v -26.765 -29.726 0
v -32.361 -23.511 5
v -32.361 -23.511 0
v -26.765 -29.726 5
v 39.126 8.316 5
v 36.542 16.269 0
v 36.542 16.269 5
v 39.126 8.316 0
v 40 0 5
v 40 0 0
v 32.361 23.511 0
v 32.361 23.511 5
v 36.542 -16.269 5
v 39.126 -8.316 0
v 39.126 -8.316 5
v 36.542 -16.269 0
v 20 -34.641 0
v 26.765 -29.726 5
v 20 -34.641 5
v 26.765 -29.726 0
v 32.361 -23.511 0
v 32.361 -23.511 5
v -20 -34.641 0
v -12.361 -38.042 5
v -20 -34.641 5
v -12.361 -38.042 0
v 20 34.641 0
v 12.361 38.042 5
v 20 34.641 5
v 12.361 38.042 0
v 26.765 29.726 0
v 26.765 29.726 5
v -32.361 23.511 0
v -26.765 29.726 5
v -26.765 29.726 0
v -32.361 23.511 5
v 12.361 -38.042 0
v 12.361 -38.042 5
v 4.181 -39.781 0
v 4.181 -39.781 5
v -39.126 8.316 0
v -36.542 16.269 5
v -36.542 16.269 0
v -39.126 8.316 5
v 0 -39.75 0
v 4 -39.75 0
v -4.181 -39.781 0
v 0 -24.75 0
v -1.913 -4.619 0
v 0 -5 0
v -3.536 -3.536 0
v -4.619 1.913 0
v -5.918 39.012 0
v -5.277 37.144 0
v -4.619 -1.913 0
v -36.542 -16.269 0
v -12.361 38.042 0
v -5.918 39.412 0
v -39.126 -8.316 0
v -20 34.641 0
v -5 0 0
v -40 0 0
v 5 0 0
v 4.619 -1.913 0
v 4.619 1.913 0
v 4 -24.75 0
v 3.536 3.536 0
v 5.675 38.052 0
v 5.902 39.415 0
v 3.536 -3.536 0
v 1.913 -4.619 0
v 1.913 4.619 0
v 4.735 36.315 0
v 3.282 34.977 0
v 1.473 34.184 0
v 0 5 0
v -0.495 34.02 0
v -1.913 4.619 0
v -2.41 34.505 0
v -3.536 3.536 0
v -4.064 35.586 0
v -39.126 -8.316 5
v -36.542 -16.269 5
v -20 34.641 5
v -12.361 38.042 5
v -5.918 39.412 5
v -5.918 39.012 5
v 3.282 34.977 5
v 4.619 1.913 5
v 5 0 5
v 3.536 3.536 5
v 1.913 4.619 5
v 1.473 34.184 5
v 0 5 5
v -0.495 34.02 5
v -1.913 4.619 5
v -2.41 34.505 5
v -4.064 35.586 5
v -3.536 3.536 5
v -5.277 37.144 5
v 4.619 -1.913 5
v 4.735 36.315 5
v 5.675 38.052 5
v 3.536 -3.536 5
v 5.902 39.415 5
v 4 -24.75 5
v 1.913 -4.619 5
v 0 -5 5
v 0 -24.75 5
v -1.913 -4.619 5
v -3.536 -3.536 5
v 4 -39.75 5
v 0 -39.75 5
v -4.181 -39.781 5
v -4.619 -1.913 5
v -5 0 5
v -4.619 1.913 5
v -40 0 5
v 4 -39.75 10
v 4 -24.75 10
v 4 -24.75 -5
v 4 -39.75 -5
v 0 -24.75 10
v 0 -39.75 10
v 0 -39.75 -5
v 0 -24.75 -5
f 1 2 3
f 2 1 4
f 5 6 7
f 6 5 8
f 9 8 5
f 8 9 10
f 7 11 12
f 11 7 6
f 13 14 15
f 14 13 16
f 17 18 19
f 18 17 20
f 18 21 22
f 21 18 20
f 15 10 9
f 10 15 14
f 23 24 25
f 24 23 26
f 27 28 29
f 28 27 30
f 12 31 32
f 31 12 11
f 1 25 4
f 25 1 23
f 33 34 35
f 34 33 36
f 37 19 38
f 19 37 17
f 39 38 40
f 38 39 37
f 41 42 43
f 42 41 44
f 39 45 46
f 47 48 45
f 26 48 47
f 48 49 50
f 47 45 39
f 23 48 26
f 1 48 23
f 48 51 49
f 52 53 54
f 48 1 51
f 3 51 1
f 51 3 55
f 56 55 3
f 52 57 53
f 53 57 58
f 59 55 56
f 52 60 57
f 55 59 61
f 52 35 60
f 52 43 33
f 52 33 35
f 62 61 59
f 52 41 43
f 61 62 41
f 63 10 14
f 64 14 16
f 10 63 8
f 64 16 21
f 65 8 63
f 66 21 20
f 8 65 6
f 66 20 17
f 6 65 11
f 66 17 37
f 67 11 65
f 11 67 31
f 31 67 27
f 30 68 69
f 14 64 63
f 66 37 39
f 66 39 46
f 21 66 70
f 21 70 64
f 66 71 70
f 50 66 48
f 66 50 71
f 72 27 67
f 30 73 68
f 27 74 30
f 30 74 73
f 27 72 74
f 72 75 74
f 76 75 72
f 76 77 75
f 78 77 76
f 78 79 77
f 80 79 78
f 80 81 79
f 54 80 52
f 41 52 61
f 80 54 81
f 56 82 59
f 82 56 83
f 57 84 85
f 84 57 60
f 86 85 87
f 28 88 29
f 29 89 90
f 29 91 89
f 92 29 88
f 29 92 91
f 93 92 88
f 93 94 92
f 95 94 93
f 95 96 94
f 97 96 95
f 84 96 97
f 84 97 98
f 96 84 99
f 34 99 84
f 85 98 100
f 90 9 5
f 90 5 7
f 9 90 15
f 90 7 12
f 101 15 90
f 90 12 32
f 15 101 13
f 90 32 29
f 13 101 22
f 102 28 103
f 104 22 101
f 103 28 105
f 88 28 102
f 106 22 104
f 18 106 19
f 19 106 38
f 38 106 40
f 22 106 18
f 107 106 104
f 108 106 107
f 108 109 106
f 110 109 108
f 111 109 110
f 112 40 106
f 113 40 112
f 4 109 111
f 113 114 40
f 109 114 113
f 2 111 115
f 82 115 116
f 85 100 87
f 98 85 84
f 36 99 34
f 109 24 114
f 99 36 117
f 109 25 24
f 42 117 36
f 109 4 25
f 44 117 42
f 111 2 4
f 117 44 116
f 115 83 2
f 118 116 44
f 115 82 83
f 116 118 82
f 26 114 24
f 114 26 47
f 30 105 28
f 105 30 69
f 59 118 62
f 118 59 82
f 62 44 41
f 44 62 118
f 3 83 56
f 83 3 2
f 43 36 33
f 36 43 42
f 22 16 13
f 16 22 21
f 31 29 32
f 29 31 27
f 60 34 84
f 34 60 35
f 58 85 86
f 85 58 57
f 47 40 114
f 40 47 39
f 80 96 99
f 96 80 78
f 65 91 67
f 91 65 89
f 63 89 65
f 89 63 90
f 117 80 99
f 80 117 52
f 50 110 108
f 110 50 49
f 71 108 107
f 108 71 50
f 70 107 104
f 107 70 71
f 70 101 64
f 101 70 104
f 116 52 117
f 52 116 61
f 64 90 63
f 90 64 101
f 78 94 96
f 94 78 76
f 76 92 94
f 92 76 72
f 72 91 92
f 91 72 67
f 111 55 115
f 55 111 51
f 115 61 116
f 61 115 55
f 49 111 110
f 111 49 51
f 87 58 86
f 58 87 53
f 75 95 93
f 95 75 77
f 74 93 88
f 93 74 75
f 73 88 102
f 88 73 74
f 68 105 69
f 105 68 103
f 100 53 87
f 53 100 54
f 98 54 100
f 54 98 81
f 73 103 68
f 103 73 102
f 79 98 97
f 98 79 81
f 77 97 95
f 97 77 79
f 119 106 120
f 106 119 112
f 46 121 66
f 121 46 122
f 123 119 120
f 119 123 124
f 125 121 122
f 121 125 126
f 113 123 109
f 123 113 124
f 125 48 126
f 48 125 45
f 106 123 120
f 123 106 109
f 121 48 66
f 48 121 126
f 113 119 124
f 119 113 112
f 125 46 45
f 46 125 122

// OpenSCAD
module rotor() {
	union() {
		difference() {
			cylinder(h=5, r=40);
			cylinder(h=5, r=5);
			translate([0,40,0]) {
				cylinder(h=5, r=6);
			}
		}
		translate([0,-39.75, -5]) {
			cube(size=[4,15,15], centre=true);
		}
	}
}

rotor();
